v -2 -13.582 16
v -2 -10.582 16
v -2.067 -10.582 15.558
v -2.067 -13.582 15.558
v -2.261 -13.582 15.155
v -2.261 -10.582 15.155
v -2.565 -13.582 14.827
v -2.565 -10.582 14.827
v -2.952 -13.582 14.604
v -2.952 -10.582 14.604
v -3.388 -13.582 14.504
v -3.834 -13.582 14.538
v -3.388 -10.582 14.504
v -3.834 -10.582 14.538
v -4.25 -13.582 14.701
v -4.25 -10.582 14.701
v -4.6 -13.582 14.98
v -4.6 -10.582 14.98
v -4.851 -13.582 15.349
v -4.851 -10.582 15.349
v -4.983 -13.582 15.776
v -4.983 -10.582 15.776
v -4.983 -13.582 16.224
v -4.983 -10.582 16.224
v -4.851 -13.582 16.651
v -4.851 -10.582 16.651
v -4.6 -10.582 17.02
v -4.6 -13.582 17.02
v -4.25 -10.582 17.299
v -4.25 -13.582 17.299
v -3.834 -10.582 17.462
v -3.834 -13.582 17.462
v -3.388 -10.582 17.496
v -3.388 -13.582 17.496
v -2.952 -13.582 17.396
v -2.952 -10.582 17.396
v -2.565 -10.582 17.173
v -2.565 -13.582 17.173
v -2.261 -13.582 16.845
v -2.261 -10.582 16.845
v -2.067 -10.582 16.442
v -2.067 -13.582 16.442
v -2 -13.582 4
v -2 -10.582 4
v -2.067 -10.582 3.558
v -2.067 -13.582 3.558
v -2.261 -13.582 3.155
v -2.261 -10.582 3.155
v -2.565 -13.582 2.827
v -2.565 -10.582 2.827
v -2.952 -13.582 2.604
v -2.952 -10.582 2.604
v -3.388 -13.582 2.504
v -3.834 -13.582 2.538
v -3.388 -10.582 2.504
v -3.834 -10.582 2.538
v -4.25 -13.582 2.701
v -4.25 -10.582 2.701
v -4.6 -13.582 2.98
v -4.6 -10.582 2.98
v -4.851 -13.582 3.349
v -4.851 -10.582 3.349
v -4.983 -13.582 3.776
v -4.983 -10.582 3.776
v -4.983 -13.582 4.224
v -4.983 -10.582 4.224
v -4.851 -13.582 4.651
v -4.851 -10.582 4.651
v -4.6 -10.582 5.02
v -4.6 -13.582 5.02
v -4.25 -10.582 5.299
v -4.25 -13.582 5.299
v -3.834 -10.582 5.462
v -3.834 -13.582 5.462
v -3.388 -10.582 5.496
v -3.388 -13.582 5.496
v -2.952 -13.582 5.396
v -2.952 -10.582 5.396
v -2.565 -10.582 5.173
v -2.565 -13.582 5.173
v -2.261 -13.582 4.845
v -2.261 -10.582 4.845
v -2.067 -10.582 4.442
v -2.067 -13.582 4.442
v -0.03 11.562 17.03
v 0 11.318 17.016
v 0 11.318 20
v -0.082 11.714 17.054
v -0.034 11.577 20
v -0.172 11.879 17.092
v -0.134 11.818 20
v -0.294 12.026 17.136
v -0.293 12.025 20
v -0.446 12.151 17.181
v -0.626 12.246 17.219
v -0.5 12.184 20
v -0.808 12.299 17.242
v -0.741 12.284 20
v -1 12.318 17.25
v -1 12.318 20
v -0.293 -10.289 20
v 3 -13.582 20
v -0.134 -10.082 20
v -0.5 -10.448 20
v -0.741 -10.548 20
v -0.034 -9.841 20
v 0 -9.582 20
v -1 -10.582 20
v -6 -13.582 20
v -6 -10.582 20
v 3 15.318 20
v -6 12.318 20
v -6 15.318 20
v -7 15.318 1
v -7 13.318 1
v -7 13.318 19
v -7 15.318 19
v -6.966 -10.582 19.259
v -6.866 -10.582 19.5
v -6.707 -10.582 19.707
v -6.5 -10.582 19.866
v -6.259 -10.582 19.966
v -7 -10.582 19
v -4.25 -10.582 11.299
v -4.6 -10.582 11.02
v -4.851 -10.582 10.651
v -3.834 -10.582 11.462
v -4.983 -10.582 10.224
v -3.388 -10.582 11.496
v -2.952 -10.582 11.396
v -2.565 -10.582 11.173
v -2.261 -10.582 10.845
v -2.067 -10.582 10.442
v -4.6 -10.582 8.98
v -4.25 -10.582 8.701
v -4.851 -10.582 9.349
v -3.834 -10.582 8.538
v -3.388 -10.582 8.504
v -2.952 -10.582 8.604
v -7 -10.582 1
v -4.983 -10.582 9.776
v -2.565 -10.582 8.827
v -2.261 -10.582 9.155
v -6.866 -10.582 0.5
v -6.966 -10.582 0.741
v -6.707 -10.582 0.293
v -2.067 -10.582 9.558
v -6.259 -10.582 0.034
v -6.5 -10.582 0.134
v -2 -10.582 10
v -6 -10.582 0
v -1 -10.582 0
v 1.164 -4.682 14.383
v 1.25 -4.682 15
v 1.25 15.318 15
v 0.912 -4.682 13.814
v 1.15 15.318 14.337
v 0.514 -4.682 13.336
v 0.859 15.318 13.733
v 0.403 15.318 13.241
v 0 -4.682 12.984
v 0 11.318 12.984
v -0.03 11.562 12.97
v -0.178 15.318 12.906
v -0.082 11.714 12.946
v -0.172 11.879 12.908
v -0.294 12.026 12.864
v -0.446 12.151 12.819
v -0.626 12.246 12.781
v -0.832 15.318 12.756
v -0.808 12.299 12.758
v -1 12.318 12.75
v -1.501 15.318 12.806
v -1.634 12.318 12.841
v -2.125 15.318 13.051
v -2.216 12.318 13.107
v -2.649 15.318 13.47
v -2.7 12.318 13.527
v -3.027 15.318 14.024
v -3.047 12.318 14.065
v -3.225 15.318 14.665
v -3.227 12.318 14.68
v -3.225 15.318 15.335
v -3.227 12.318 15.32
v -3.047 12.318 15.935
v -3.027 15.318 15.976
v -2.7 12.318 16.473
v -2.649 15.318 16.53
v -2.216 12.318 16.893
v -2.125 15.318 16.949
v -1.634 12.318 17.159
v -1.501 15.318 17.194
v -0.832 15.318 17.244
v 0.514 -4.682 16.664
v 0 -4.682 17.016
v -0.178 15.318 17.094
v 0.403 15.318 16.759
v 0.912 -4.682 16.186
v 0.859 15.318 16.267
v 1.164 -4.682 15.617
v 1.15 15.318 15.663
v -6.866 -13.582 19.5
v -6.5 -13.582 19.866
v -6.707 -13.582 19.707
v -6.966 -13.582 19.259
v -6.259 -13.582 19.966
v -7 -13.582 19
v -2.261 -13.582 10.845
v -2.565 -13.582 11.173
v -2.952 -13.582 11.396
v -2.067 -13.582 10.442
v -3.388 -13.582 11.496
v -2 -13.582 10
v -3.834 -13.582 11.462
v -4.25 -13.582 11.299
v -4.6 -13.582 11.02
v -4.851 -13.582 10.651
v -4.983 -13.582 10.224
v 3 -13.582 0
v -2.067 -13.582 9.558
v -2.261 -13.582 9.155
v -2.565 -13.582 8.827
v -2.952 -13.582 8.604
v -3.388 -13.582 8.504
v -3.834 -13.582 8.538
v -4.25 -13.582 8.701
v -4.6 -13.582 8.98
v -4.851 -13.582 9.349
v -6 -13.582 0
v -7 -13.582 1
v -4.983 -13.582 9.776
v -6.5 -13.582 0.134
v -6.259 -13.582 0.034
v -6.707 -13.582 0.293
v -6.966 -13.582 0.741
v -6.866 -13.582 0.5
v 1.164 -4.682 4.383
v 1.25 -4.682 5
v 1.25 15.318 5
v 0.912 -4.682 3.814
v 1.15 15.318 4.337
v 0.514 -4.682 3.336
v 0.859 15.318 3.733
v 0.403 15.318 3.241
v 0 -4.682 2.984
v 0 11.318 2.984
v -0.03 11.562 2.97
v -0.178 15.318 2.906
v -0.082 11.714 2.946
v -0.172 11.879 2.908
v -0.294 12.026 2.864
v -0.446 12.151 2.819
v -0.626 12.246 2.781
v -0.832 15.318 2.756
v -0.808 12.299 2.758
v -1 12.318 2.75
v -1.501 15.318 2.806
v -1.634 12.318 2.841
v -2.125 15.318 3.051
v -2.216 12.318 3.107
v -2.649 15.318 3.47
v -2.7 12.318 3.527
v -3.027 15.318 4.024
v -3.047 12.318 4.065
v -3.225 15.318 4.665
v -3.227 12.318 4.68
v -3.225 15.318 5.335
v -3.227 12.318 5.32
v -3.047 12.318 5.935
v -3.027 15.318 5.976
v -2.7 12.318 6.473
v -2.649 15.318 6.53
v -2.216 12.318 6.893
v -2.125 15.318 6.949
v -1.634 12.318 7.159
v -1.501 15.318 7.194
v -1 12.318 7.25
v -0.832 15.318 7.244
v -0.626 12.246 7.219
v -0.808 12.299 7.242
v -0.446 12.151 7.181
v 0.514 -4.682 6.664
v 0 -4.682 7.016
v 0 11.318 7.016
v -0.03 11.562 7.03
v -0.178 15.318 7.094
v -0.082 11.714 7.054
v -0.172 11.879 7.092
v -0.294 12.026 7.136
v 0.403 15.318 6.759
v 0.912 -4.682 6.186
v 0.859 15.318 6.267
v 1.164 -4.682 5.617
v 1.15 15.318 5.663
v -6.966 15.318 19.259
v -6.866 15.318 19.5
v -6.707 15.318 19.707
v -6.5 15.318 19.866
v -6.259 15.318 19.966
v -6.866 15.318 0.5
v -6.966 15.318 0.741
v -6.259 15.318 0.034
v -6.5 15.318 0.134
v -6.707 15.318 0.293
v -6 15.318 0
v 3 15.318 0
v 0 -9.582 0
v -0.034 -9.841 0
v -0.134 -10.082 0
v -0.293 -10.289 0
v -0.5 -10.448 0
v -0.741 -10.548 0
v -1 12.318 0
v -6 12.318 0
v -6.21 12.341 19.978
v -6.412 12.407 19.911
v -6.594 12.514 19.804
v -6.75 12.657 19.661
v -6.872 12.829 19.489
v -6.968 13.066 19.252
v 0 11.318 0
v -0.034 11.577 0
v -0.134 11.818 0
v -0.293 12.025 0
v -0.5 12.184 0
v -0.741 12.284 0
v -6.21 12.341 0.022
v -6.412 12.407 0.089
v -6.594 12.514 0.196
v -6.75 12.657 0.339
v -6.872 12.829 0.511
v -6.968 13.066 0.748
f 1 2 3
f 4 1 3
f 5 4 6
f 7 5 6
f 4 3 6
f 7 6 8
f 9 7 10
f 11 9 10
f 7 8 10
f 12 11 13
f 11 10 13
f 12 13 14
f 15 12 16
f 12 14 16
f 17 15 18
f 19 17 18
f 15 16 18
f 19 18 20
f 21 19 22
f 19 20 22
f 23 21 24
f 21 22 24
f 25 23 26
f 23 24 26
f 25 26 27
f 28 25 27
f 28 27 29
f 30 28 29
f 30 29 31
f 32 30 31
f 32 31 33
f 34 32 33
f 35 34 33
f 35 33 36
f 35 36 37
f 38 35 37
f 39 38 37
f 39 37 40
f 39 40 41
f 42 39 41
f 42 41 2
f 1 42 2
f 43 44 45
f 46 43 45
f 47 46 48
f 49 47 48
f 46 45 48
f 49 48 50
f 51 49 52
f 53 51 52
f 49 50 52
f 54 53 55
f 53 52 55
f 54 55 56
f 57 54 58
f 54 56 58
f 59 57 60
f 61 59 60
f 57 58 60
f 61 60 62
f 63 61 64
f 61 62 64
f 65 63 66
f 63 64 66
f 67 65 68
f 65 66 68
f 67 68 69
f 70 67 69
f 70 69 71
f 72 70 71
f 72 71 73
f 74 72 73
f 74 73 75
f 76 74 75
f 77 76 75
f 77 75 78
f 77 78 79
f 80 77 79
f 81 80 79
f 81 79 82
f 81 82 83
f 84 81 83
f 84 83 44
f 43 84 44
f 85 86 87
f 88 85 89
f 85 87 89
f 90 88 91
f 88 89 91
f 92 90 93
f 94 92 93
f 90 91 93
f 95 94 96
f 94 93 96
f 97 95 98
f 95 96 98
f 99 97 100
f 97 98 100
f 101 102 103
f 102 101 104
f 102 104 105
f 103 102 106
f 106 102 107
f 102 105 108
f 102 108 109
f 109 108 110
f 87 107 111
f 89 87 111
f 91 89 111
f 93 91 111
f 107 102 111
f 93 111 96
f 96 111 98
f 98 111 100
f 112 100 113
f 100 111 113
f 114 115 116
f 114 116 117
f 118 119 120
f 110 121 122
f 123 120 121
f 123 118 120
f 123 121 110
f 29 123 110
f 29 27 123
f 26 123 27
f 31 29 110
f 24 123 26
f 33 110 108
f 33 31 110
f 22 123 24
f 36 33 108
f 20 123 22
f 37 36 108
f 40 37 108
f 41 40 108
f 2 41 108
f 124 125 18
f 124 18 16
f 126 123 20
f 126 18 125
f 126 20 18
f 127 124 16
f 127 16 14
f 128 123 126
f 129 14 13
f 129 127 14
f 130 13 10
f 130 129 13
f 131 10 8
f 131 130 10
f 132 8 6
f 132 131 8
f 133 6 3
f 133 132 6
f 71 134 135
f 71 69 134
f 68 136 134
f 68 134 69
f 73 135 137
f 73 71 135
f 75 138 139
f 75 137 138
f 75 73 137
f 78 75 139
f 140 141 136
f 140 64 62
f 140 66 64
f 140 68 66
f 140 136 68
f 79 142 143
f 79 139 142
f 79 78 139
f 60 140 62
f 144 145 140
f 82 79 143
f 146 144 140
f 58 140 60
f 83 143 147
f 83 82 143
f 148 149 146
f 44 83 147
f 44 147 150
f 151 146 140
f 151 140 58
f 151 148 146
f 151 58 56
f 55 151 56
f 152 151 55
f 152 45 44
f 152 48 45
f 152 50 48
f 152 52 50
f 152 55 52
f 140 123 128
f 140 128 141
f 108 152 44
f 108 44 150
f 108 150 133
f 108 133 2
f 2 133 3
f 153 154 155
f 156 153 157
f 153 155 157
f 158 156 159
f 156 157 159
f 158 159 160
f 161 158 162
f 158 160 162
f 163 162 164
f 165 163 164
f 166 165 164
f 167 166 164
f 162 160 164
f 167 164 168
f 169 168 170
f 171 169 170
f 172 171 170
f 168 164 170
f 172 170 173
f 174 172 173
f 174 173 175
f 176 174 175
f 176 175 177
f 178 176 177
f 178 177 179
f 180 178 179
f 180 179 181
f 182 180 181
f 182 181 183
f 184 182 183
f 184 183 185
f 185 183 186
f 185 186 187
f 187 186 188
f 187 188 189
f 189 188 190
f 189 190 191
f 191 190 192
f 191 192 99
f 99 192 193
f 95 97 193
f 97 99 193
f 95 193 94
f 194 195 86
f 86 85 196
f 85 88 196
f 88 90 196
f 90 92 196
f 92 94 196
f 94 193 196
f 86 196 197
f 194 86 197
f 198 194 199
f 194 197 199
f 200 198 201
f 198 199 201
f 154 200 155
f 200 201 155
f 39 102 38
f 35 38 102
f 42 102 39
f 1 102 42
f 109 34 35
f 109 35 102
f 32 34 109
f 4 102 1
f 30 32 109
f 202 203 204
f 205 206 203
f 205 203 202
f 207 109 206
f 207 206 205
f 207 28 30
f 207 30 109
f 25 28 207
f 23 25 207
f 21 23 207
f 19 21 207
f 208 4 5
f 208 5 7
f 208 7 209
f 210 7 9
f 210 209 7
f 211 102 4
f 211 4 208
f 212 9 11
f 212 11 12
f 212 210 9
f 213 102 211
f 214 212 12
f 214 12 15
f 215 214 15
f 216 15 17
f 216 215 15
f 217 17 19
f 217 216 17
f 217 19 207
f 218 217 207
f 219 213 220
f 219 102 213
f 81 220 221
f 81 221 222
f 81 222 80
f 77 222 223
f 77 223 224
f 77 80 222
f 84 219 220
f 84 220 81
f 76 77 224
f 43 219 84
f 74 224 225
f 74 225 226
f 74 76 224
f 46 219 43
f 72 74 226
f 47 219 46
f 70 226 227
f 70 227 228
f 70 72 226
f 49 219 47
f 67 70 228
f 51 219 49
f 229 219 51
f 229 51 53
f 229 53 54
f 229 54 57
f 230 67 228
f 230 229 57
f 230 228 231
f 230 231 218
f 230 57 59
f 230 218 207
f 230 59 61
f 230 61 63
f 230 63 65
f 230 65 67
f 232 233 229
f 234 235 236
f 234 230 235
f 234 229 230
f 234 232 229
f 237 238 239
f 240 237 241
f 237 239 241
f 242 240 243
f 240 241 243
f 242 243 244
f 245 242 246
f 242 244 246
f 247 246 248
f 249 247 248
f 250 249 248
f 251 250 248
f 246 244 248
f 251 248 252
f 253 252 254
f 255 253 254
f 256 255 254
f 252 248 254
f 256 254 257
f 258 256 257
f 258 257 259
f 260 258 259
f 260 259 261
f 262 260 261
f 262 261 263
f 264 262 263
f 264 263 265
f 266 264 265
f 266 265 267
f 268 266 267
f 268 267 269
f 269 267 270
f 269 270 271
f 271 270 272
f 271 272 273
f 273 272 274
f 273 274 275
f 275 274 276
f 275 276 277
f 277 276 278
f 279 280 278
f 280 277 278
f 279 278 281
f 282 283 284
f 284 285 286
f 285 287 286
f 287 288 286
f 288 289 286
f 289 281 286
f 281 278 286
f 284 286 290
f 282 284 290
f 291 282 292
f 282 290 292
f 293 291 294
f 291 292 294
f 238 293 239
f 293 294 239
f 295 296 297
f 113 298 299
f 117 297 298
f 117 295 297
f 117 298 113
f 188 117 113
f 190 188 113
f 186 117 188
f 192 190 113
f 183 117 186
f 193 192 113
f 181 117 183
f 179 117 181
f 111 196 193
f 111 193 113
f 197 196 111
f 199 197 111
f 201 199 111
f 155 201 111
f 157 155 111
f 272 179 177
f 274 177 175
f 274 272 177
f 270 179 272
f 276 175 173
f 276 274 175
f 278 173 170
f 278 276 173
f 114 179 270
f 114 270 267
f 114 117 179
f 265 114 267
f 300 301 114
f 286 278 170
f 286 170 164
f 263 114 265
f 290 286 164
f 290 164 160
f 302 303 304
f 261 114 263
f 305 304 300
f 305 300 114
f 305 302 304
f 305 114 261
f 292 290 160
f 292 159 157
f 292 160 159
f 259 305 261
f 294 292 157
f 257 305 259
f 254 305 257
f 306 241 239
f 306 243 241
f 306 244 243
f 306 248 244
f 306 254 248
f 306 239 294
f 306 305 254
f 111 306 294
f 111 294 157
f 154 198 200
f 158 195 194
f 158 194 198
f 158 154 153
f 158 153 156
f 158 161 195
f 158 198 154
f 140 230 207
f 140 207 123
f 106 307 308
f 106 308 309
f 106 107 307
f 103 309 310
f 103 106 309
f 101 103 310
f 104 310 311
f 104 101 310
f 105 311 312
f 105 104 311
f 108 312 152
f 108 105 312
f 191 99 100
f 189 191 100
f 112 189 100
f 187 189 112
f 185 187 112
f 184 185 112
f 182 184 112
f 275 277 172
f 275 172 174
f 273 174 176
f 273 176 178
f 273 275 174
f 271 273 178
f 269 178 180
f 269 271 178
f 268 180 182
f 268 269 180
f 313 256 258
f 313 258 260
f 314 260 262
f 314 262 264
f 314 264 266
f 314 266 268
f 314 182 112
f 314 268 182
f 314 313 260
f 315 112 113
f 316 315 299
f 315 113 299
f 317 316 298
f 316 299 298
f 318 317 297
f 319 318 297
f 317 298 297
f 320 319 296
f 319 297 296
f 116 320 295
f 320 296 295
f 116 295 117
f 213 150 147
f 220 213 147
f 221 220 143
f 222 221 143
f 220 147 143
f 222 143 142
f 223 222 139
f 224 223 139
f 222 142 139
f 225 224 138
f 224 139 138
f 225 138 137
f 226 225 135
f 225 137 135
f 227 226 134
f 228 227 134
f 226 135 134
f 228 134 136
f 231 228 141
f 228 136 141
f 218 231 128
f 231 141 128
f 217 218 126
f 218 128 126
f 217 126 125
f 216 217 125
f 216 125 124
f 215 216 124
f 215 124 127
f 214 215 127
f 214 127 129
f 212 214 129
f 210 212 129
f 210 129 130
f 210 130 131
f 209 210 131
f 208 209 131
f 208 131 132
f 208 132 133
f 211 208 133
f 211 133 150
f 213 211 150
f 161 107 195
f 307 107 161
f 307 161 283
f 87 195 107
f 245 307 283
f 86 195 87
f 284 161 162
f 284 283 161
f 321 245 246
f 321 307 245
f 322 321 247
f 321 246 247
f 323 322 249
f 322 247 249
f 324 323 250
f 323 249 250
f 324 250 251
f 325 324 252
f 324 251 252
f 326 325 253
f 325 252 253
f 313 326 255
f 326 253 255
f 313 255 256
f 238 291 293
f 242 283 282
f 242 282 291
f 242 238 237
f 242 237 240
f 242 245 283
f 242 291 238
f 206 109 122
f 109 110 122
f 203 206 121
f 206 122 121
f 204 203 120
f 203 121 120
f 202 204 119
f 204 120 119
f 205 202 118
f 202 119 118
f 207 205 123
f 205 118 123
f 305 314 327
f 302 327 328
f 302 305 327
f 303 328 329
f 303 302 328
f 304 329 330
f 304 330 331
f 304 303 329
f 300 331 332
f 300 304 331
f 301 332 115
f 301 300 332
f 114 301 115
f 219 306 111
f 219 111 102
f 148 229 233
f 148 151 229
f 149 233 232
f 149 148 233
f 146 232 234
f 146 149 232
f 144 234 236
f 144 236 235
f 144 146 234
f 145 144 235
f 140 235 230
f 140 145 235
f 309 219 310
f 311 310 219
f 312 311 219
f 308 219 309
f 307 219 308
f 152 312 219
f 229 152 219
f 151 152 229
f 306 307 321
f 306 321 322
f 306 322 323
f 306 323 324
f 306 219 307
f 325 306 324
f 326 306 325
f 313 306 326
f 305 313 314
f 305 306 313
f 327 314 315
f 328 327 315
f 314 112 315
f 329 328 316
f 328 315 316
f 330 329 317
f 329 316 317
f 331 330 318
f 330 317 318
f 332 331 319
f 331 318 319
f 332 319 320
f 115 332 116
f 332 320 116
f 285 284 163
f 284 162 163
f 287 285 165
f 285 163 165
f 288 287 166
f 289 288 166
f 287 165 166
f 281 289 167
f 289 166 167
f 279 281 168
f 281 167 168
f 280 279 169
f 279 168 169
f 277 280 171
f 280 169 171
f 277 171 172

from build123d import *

# Parameters (mm, degrees)
BOSS_EXTRUDE1_DEPTH = 20
SKETCH2_R           = 2.25
CUT_EXTRUDE1_DEPTH  = 20
SKETCH3_R           = 1.5
CUT_EXTRUDE2_DEPTH  = 20
FILLET1_R           = 1
FILLET2_R           = 1


with BuildPart() as part:
    # Sketch1 → Boss-Extrude1 (new body)
    with BuildSketch(Plane.XY):
        Polygon((0, -10.581899729), (0, 12.318100271), (-7, 12.318100271), (-7, 15.318100271), (3, 15.318100271), (3, -13.581899729), (-7, -13.581899729), (-7, -10.581899729), align=None)
    extrude(amount=BOSS_EXTRUDE1_DEPTH)

    # Sketch2 → Cut-Extrude1 (cut)
    with BuildSketch(Plane(origin=(0, 15.318100271, 0), x_dir=(1, 0, 0), z_dir=(0, 1, 0))):
        with Locations((-1, -5)):
            Circle(SKETCH2_R)
        with Locations((-1, -15)):
            Circle(SKETCH2_R)
    extrude(amount=-CUT_EXTRUDE1_DEPTH, mode=Mode.SUBTRACT)

    # Sketch3 → Cut-Extrude2 (cut)
    with BuildSketch(Plane(origin=(0, -10.581899729, 0), x_dir=(1, 0, 0), z_dir=(0, 1, 0))):
        with Locations((-3.5, -4)):
            Circle(SKETCH3_R)
        with Locations((-3.5, -10)):
            Circle(SKETCH3_R)
        with Locations((-3.5, -16)):
            Circle(SKETCH3_R)
    extrude(amount=-CUT_EXTRUDE2_DEPTH, mode=Mode.SUBTRACT)

    # Fillet1
    fillet1_edges = [part.edges().sort_by_distance(p)[0] for p in [
        (-7, -12.081899729, 0),
        (0, -10.581899729, 10),
        (-7, 12.318100271, 10),
        (-7, 13.818100271, 20),
        (-7, -12.081899729, 20),
        (-7, 13.818100271, 0),
    ]]
    fillet(fillet1_edges, radius=FILLET1_R)

    # Fillet2
    fillet2_edges = [part.edges().sort_by_distance(p)[0] for p in [
        (0, 12.318100271, 18.507782219),
        (0, 12.318100271, 10),
        (0, 12.318100271, 1.492217781),
    ]]
    fillet(fillet2_edges, radius=FILLET2_R)


solid = part.part
